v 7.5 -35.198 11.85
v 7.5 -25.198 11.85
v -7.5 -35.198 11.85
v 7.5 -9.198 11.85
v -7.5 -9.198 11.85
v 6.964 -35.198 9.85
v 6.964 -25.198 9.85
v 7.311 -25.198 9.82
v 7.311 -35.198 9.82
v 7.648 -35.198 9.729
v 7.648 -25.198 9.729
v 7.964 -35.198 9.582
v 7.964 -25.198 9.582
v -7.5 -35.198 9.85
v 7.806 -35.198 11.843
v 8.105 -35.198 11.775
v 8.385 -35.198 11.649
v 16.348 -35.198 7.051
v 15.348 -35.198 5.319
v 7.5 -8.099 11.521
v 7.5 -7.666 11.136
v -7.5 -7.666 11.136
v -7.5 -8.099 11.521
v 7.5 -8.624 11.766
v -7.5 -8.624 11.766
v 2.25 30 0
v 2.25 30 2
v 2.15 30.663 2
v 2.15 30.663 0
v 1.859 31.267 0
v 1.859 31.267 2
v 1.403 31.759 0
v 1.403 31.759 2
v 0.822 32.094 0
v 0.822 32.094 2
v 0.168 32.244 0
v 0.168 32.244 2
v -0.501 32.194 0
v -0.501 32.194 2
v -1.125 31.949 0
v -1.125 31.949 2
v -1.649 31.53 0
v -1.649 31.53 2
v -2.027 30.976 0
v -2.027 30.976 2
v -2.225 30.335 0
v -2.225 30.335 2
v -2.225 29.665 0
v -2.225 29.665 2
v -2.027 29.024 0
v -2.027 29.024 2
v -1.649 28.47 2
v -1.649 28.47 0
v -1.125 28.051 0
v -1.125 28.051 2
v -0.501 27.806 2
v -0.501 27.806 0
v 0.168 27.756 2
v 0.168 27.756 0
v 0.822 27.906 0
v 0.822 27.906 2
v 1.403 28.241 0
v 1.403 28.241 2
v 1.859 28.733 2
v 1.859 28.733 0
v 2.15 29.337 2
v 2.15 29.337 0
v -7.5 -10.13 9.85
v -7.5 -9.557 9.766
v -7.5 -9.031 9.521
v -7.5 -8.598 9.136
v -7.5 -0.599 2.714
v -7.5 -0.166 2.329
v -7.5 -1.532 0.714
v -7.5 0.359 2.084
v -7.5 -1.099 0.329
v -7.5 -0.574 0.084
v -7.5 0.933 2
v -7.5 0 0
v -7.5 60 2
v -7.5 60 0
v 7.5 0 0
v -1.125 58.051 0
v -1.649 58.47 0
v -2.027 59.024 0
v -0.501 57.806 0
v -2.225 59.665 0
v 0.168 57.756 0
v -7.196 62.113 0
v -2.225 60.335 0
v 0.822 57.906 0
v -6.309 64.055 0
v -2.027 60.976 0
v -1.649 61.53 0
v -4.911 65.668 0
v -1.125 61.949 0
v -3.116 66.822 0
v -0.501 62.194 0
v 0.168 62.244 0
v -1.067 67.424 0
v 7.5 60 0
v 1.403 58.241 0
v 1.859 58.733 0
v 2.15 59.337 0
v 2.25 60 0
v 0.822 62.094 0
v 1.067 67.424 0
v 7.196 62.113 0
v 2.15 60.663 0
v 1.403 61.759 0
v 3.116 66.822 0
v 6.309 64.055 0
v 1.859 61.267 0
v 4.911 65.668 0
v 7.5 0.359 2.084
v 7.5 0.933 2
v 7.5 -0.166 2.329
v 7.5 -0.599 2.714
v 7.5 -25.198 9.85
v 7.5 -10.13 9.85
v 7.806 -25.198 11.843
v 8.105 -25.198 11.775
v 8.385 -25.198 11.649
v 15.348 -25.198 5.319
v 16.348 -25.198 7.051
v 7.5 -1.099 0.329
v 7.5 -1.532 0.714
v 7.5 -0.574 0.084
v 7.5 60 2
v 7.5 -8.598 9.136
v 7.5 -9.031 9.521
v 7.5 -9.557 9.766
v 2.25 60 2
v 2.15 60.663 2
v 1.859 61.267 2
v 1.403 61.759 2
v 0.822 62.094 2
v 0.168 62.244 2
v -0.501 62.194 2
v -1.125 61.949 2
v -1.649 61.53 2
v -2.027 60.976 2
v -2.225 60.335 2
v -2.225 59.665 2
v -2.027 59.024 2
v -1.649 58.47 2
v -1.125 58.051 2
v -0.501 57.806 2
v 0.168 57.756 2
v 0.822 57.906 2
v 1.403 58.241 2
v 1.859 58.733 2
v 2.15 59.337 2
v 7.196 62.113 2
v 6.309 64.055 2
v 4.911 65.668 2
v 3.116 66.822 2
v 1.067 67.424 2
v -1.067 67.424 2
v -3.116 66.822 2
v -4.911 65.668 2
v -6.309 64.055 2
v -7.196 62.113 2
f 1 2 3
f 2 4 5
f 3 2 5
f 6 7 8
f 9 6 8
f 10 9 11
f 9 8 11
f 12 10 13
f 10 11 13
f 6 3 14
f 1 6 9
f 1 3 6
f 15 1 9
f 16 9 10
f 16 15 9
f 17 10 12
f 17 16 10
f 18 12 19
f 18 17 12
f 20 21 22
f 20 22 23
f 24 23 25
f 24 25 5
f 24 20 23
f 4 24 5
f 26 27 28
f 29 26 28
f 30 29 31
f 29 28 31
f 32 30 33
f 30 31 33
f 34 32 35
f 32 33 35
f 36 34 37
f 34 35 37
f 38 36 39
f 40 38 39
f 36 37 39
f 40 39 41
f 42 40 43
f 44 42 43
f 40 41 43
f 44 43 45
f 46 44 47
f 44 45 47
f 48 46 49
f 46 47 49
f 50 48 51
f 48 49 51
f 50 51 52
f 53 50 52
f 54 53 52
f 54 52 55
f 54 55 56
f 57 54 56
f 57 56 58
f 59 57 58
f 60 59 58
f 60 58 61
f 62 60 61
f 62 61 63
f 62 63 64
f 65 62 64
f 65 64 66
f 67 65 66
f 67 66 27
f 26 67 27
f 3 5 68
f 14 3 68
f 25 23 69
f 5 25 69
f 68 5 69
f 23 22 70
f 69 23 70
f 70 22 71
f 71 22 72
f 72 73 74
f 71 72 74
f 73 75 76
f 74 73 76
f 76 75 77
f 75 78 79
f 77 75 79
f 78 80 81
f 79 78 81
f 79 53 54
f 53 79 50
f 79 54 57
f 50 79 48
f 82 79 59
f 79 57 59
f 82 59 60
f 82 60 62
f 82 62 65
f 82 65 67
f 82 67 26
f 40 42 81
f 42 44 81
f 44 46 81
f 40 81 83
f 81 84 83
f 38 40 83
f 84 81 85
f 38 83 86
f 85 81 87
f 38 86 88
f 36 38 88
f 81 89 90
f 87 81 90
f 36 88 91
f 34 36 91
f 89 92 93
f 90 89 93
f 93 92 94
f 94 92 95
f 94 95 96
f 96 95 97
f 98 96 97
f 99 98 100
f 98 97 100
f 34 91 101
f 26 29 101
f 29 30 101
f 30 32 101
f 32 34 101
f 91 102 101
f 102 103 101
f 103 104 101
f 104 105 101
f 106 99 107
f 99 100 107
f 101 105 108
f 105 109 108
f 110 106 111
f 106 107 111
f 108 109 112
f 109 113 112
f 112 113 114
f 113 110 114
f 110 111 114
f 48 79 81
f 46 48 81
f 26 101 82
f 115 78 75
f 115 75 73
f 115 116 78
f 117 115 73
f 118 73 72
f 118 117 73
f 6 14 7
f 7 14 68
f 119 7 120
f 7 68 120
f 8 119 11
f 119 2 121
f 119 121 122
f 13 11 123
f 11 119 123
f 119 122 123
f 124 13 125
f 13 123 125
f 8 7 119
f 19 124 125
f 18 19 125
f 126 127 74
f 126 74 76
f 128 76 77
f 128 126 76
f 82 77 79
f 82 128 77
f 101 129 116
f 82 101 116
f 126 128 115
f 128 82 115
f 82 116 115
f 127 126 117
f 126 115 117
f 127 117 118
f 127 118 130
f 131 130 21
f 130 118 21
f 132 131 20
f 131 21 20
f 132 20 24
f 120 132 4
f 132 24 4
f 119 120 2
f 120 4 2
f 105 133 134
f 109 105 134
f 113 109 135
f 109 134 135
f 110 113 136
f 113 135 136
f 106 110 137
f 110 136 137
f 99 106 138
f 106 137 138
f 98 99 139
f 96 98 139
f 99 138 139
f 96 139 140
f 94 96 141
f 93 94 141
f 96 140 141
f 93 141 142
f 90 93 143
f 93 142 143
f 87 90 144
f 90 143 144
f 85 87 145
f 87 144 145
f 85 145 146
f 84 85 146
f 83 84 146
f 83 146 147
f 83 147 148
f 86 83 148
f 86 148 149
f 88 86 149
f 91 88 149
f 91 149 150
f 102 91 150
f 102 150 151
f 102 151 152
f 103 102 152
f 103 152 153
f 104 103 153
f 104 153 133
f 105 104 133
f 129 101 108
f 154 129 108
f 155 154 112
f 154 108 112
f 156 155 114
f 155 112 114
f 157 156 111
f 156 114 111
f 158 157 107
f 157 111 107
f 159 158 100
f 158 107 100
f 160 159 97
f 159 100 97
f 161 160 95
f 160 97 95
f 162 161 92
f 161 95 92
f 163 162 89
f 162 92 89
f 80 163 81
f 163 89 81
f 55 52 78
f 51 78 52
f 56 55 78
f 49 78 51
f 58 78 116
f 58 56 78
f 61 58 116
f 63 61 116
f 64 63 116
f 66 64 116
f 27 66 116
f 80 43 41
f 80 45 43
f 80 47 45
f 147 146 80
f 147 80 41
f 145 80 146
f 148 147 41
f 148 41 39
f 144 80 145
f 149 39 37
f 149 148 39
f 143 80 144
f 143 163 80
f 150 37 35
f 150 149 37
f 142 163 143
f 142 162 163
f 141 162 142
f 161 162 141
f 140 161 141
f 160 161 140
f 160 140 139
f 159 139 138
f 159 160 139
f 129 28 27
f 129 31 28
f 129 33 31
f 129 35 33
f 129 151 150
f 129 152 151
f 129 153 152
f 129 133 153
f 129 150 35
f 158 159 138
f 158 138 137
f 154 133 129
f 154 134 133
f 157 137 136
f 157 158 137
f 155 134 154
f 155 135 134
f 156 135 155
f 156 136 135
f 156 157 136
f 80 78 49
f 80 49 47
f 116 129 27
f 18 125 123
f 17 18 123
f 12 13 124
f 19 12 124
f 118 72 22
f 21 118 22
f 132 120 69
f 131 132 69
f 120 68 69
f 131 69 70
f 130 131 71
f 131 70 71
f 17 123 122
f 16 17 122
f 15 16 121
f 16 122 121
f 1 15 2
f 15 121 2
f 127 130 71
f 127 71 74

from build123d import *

# Parameters (mm, degrees)
F1_DEPTH     = 2
F3_DEPTH     = 15
F4_W         = 15
F4_H         = 36.1711822092
F5_DEPTH     = 2
F6_W         = 16
F6_H         = 2
F7_DEPTH     = 15
F8_R         = 2
F11_DEPTH    = 10
F12_R        = 2.25
F13_DEPTH    = 25
F14_T1_DEPTH = 10


# Not quite as in the source:
# - a fillet or chamfer that OpenCascade refuses, or shapes differently, is made with other operations: its cross-section is extruded or revolved along the edge and cut away or added


with BuildPart() as f1:
    # F0 (on Top) → F1 (new body)
    with BuildSketch(Plane.XY):
        with BuildLine():
            Line((-7.5, 60), (-7.5, 0))
            Line((-7.5, 0), (7.5, 0))
            Line((7.5, 0), (7.5, 60))
            ThreePointArc((7.5, 60), (0, 67.5), (-7.5, 60))
        make_face()
    extrude(amount=F1_DEPTH)

    # F2 (on face) → F3 (join, through all)
    with BuildSketch(Plane.YZ.offset(7.5)):
        with BuildLine():
            Line((-9.1977466834, 9.85), (-1.5320888862, 0.7144247806))
            ThreePointArc((-1.5320888862, 0.7144247806), (-0.8452365235, 0.1873844259), (0, 0))
            Line((0, 0), (0, 2))
            Line((0, 2), (-7.6656577972, 11.1355752194))
            ThreePointArc((-7.6656577972, 11.1355752194), (-8.3525101599, 11.6626155741), (-9.1977466834, 11.85))
            Line((-9.1977466834, 11.85), (-9.1977466834, 9.85))
        make_face()
    extrude(amount=-F3_DEPTH)

    # F6 (on face) → F7 (join, through all)
    with BuildSketch(Plane(origin=(-7.5, 0, 0), x_dir=(0, -1, 0), z_dir=(-1, 0, 0))):
        with Locations((17.1977466834, 10.85)):
            Rectangle(F6_W, F6_H)
    extrude(amount=-F7_DEPTH)

    # F8
    f8_edges = [f1.edges().sort_by_distance(p)[0] for p in [
        (0, 0, 0),
        (0, 0, 2),
        (0, -9.197747, 11.85),
        (0, -9.197747, 9.85),
    ]]
    fillet(f8_edges, radius=F8_R)

    # F10 (on face) → F11 (join)
    with BuildSketch(Plane.XZ.offset(25.1977466834)):
        with BuildLine():
            Line((-7.5, 9.85), (7.5, 9.85))
            Line((7.5, 9.85), (15.3476885433, 5.319134907))
            Line((15.3476885433, 5.319134907), (16.3476885433, 7.0511857146))
            Line((16.3476885433, 7.0511857146), (8.384588029, 11.6486839401))
            ThreePointArc((8.384588029, 11.6486839401), (7.9574981533, 11.8161493535), (7.5, 11.85))
            Line((7.5, 11.85), (-7.5, 11.85))
            Line((-7.5, 11.85), (-7.5, 9.85))
        make_face()
    extrude(amount=F11_DEPTH)

    # F12 (on face) → F13 (cut)
    with BuildSketch(Plane.XY.offset(2)):
        with Locations((0, 60)):
            Circle(F12_R)
        with Locations((0, 30)):
            Circle(F12_R)
    extrude(amount=-F13_DEPTH, mode=Mode.SUBTRACT)

    # F14: fillet of radius 2 on 1 edges, made by hand

    # F14_s2 → F14_t1 (join)
    with BuildSketch(Plane.XZ.offset(25.1977466834)):
        with BuildLine():
            ThreePointArc((6.9641016151, 9.85), (7.4817397053, 9.7818516526), (7.9641016151, 9.5820508076))
            Line((7.9641016151, 9.5820508076), (7.5, 9.85))
            Line((7.5, 9.85), (6.9641016151, 9.85))
        make_face()
    extrude(amount=F14_T1_DEPTH)


with BuildPart() as f5:
    # F4 (on face) → F5 (new body)
    with BuildSketch(Plane.XY.offset(2)):
        with Locations((0, -25.7512489018)):
            Rectangle(F4_W, F4_H)
    extrude(amount=F5_DEPTH)


solid = f1.part
